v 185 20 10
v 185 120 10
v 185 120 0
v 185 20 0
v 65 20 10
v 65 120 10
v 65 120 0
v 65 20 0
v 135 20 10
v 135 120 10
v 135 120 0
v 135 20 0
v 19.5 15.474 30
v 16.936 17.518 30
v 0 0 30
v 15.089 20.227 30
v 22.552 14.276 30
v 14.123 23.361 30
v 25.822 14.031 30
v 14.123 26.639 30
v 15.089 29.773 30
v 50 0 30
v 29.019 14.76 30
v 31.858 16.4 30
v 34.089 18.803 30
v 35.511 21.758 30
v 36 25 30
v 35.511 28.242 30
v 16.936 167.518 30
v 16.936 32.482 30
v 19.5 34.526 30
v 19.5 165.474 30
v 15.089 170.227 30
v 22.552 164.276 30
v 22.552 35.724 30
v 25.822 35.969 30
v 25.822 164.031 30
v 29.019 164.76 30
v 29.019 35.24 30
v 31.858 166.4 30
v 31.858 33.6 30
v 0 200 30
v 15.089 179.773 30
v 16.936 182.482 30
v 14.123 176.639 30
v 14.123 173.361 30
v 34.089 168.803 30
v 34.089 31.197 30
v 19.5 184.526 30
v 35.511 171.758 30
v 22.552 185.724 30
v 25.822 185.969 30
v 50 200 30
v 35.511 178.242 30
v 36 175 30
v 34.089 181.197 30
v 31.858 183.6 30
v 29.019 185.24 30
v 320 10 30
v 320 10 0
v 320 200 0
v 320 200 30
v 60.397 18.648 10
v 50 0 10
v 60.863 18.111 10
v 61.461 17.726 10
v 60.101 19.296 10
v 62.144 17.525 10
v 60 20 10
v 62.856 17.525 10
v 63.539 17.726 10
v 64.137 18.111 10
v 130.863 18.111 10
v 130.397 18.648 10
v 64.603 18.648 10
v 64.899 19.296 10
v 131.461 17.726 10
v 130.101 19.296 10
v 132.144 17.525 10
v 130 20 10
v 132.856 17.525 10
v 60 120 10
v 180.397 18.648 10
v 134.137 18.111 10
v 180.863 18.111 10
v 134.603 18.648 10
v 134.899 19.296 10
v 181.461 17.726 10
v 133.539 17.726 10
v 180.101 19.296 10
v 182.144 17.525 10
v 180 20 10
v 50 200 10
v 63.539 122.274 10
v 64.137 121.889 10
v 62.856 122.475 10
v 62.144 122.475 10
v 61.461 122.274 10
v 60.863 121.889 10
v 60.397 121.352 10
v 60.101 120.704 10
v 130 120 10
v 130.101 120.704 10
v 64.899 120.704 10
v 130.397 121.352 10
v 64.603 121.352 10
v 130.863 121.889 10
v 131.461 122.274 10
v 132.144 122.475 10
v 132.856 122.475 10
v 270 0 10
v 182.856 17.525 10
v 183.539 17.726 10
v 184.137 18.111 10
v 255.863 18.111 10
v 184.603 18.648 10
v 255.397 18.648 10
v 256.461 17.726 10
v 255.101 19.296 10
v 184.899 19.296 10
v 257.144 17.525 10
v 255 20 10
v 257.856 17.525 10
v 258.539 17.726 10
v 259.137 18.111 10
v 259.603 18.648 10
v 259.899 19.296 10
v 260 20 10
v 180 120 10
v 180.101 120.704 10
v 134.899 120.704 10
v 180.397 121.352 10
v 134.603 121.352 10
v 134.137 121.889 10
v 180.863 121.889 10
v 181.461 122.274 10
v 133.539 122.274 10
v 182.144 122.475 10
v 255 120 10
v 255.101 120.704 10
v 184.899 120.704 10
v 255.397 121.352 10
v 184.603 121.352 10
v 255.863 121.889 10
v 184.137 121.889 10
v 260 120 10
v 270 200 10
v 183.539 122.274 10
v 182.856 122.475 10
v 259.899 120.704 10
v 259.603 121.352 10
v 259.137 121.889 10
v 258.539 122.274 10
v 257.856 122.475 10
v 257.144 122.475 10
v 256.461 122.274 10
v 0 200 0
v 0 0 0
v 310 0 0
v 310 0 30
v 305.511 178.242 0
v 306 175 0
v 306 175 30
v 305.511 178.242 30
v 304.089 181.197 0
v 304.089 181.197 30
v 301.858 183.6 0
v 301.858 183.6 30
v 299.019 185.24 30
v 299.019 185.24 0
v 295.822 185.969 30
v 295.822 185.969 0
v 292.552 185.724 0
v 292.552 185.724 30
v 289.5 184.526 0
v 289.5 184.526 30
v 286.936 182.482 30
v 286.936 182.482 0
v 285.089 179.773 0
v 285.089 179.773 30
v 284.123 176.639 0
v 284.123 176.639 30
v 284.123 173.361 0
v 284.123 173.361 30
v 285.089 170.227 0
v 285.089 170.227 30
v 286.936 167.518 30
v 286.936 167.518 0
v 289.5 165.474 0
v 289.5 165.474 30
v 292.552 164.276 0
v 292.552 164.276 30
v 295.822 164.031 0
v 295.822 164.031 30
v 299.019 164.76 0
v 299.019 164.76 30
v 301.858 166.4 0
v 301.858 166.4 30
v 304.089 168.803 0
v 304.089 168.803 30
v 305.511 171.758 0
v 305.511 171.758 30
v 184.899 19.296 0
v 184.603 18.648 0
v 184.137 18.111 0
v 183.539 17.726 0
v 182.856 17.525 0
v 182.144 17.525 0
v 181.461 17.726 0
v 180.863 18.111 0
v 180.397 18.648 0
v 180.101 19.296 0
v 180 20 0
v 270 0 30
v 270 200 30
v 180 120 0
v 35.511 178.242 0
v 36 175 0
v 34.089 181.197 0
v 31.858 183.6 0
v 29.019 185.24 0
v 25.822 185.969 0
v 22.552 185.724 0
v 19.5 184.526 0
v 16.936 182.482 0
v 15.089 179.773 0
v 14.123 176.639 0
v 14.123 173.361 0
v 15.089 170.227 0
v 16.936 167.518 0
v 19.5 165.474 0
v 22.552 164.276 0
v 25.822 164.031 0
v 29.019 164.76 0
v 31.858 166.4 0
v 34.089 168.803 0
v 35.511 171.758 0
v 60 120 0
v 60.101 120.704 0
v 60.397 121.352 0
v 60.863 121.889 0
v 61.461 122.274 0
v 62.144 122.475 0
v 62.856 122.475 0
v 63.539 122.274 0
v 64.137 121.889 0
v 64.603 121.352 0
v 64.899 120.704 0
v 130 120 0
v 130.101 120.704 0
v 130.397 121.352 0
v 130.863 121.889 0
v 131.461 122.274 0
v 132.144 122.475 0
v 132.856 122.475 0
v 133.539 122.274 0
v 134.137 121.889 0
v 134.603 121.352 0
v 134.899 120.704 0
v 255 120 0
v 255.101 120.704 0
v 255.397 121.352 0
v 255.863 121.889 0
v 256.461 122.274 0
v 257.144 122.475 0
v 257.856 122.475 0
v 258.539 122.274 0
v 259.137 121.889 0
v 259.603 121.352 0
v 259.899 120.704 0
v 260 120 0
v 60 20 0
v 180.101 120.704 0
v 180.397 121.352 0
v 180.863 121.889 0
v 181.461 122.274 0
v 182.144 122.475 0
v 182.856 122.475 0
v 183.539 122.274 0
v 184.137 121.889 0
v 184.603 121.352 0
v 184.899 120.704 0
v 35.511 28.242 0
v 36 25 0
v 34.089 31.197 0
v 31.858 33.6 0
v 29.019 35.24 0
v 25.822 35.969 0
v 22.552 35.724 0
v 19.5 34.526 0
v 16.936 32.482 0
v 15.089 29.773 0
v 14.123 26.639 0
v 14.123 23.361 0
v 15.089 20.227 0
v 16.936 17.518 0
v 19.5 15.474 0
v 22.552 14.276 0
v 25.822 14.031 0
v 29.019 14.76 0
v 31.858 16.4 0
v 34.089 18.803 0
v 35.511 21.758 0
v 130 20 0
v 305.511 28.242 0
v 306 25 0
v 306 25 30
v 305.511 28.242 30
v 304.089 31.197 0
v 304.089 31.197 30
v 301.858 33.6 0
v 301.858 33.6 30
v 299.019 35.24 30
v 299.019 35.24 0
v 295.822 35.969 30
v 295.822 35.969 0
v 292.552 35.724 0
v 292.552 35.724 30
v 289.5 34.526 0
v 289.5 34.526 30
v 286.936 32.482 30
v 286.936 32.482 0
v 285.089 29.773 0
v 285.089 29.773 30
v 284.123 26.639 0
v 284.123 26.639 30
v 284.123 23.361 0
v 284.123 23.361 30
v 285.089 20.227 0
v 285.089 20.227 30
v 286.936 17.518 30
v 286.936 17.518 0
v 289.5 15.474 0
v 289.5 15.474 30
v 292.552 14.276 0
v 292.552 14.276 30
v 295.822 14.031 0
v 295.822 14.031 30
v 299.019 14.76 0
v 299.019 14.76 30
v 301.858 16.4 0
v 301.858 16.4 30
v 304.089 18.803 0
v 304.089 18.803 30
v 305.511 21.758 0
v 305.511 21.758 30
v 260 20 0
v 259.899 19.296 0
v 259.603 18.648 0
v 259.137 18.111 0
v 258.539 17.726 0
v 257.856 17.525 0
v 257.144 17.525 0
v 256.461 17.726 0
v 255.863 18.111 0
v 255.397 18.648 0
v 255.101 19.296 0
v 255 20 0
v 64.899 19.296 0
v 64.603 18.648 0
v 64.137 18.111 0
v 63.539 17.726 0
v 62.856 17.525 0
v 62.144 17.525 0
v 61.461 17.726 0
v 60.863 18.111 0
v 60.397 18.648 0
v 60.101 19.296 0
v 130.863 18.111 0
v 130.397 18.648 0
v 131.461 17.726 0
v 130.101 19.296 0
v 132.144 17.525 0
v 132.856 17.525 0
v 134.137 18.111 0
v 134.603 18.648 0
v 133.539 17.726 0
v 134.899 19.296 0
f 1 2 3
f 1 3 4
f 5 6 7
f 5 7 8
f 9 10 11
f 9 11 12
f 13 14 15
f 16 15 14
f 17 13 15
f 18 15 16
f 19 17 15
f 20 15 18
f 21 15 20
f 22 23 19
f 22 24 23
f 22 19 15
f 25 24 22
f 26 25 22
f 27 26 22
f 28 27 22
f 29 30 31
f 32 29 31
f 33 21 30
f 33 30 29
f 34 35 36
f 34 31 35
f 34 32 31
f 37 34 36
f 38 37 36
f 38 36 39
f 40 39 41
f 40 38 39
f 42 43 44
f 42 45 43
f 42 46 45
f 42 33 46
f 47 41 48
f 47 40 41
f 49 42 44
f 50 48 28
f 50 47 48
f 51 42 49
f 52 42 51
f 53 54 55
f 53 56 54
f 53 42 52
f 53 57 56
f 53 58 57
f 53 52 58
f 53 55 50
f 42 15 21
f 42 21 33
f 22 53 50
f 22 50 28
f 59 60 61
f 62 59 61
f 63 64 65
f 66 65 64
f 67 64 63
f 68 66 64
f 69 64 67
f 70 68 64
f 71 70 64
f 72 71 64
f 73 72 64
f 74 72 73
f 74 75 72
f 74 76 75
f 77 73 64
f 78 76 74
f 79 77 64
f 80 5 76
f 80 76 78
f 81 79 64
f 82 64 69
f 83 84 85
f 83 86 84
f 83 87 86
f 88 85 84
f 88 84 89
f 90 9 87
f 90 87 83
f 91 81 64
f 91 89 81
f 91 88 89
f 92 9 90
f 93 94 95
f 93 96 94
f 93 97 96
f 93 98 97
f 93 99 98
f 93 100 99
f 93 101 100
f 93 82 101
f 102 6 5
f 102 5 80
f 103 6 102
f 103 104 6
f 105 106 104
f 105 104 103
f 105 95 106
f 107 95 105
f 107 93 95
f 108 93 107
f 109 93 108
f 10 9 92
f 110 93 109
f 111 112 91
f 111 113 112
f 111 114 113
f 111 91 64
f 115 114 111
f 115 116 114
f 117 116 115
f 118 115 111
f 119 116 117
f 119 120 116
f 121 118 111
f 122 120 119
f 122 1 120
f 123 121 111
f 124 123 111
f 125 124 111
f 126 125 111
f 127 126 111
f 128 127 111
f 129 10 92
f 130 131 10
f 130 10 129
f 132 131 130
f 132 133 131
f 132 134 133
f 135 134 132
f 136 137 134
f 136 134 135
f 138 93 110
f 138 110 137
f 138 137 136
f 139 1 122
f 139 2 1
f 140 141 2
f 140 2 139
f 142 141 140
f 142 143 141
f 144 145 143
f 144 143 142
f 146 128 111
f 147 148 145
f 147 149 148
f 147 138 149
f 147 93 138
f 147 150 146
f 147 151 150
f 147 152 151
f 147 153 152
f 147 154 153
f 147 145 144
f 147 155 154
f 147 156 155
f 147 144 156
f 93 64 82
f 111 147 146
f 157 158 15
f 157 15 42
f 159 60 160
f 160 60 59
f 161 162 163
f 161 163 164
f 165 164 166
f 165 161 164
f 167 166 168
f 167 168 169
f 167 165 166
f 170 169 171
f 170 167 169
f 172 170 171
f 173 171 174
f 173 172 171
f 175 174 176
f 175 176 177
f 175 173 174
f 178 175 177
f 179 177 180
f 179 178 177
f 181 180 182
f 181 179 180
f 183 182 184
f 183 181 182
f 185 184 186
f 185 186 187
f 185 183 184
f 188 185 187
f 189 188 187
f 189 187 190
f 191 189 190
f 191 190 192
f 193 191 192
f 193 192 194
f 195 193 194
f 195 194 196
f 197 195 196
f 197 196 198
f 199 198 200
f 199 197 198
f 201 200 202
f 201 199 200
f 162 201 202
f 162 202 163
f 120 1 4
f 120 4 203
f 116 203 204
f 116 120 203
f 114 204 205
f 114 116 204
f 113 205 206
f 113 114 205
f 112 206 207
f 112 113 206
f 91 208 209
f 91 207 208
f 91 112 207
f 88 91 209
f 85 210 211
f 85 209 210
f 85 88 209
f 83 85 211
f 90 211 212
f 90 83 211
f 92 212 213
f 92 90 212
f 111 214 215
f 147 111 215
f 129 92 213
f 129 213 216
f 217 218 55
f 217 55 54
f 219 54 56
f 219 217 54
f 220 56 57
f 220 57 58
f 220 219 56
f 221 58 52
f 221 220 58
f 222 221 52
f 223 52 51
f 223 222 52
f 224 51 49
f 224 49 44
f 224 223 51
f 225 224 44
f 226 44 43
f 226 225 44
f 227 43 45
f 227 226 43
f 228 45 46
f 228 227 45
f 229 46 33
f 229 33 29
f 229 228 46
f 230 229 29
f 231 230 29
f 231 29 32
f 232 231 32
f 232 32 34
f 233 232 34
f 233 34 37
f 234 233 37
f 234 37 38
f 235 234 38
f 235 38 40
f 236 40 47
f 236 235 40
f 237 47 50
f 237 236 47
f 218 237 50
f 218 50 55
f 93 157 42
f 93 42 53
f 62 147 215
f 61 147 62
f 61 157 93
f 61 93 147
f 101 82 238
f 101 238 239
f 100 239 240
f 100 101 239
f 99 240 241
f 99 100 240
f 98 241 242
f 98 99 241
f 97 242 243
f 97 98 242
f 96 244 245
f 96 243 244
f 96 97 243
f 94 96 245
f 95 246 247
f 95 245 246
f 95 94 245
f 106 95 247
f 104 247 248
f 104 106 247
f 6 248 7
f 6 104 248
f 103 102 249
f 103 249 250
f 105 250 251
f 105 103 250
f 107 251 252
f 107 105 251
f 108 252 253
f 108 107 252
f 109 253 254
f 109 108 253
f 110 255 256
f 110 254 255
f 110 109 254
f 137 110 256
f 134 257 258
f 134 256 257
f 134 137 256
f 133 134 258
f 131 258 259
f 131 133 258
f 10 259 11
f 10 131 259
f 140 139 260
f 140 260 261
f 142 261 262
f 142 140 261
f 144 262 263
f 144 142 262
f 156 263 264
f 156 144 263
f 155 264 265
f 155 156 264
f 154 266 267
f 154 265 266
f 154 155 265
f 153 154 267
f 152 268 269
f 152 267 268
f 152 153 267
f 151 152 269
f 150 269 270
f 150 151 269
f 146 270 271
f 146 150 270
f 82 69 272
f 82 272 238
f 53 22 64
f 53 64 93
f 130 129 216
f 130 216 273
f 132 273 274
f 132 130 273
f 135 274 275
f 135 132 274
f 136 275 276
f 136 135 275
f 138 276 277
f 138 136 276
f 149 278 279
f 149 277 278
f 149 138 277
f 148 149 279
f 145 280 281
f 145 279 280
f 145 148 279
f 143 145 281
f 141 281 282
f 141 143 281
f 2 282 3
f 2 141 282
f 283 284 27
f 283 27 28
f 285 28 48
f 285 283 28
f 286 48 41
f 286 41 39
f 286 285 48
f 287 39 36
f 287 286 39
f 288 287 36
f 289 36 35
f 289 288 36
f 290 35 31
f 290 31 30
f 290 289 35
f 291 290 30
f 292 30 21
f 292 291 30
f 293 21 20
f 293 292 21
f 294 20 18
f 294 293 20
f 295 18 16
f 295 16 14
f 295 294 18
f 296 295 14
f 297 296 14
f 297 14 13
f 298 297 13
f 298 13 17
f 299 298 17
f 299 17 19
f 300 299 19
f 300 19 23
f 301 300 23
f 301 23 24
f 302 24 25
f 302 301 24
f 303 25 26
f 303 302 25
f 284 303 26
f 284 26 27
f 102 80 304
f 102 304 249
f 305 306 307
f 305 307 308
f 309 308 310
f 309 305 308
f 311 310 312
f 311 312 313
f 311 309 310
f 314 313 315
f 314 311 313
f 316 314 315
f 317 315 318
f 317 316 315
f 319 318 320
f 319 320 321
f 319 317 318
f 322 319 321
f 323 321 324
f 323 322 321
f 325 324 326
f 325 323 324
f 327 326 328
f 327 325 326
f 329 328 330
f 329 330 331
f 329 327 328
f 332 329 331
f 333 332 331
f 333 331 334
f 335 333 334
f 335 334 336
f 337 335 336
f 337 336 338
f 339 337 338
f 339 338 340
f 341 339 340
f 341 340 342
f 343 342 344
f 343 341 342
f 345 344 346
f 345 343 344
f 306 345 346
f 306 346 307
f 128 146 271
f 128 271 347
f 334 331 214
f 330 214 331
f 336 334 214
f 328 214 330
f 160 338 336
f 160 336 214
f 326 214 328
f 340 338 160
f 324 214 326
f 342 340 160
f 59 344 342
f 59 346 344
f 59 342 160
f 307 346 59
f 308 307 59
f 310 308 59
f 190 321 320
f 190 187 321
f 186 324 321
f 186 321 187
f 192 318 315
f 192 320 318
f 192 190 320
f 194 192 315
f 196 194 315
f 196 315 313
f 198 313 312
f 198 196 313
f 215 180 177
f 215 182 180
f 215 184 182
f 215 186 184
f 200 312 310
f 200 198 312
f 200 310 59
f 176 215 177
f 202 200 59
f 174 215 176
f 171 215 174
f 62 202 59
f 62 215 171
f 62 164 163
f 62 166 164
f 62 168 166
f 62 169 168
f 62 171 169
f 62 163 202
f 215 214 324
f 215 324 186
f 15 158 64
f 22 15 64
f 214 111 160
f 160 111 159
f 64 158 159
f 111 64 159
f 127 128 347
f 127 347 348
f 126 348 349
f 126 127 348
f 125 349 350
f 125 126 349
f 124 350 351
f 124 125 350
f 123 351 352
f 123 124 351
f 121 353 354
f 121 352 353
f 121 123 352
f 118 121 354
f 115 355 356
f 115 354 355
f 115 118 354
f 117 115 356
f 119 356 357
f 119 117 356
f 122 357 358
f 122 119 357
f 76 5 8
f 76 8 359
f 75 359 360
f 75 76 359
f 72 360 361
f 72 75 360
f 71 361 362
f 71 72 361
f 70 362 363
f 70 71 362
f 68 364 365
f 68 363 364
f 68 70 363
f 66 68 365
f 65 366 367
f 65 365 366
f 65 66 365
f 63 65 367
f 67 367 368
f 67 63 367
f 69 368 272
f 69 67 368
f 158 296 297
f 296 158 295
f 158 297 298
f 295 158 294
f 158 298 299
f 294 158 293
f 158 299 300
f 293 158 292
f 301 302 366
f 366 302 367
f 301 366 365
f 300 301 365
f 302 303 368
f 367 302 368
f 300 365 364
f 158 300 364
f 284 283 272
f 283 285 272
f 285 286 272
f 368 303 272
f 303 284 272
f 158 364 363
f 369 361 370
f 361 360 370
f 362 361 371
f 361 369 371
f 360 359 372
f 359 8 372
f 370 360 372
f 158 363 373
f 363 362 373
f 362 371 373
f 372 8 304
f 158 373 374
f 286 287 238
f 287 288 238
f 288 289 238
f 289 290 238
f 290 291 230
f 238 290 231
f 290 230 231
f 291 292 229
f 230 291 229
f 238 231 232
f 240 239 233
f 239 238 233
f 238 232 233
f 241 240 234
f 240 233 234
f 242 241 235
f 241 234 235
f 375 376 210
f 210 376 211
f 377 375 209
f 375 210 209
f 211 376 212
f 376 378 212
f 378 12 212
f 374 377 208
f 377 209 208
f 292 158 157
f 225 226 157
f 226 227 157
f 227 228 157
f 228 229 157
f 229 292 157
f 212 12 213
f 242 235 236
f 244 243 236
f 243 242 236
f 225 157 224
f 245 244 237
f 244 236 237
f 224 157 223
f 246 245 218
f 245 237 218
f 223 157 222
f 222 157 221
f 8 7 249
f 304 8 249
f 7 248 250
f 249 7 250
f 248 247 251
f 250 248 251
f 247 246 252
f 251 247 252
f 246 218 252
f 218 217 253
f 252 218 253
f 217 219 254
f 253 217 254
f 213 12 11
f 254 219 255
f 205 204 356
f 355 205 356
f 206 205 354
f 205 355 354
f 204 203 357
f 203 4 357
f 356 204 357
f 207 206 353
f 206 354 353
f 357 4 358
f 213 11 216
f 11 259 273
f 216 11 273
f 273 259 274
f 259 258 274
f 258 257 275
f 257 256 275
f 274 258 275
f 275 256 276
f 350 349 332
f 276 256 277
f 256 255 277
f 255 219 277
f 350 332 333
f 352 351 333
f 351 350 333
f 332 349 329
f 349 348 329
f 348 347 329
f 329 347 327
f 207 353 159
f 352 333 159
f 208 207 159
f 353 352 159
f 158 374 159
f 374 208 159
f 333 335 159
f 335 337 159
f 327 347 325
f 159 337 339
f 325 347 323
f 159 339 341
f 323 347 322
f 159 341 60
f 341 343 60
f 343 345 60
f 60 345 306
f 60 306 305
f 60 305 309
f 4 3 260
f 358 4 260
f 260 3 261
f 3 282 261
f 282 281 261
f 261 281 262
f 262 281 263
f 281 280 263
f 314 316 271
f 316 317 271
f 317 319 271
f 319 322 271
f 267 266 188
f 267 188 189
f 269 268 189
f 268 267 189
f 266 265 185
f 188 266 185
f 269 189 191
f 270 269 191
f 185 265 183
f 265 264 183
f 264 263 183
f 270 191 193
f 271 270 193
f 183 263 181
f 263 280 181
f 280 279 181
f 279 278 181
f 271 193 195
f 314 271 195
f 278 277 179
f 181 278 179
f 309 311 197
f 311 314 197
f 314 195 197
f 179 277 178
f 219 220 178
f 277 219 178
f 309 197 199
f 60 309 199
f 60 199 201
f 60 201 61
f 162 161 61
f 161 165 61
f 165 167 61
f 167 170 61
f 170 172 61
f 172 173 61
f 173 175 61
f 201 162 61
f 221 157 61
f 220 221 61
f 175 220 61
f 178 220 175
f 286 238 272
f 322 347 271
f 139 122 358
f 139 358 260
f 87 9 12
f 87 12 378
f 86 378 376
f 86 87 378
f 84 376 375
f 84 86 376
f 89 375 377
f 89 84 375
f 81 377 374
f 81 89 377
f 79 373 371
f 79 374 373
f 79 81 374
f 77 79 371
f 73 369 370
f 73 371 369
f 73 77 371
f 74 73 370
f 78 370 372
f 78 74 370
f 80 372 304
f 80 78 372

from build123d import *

# Parameters (mm, degrees)
SKETCH1_W           = 320
SKETCH1_H           = 200
SKETCH1_R           = 11
BOSS_EXTRUDE1_DEPTH = 30
CUT_EXTRUDE1_DEPTH  = 379.549864615
SKETCH4_W           = 220
SKETCH4_H           = 200
CUT_EXTRUDE2_DEPTH  = 20
CHAMFER1_SIZE       = 10


with BuildPart() as part:
    # Sketch1 → Boss-Extrude1 (new body)
    with BuildSketch(Plane.XY):
        with Locations((160, 100)):
            Rectangle(SKETCH1_W, SKETCH1_H)
        with Locations((25, 175)):
            Circle(SKETCH1_R, mode=Mode.SUBTRACT)
        with Locations((295, 175)):
            Circle(SKETCH1_R, mode=Mode.SUBTRACT)
        with Locations((25, 25)):
            Circle(SKETCH1_R, mode=Mode.SUBTRACT)
        with Locations((295, 25)):
            Circle(SKETCH1_R, mode=Mode.SUBTRACT)
    extrude(amount=BOSS_EXTRUDE1_DEPTH)

    # Sketch2 → Cut-Extrude1 (cut, through all)
    with BuildSketch(Plane.XY.offset(30)):
        with BuildLine():
            Line((260, 120), (260, 20))
            ThreePointArc((260, 20), (257.5, 17.5), (255, 20))
            Line((255, 20), (255, 120))
            ThreePointArc((255, 120), (257.5, 122.5), (260, 120))
        make_face()
        with BuildLine():
            Line((185, 120), (185, 20))
            ThreePointArc((185, 20), (182.5, 17.5), (180, 20))
            Line((180, 20), (180, 120))
            ThreePointArc((180, 120), (182.5, 122.5), (185, 120))
        make_face()
        with BuildLine():
            Line((65, 120), (65, 20))
            ThreePointArc((65, 20), (62.5, 17.5), (60, 20))
            Line((60, 20), (60, 120))
            ThreePointArc((60, 120), (62.5, 122.5), (65, 120))
        make_face()
        with BuildLine():
            Line((135, 120), (135, 20))
            ThreePointArc((135, 20), (132.5, 17.5), (130, 20))
            Line((130, 20), (130, 120))
            ThreePointArc((130, 120), (132.5, 122.5), (135, 120))
        make_face()
    extrude(amount=-CUT_EXTRUDE1_DEPTH, mode=Mode.SUBTRACT)

    # Sketch4 → Cut-Extrude2 (cut)
    with BuildSketch(Plane.XY.offset(30)):
        with Locations((160, 100)):
            Rectangle(SKETCH4_W, SKETCH4_H)
    extrude(amount=-CUT_EXTRUDE2_DEPTH, mode=Mode.SUBTRACT)

    # Chamfer1
    chamfer1_edges = [part.edges().sort_by_distance(p)[0] for p in [
        (320, 0, 15),
    ]]
    chamfer(chamfer1_edges, length=CHAMFER1_SIZE)


solid = part.part
